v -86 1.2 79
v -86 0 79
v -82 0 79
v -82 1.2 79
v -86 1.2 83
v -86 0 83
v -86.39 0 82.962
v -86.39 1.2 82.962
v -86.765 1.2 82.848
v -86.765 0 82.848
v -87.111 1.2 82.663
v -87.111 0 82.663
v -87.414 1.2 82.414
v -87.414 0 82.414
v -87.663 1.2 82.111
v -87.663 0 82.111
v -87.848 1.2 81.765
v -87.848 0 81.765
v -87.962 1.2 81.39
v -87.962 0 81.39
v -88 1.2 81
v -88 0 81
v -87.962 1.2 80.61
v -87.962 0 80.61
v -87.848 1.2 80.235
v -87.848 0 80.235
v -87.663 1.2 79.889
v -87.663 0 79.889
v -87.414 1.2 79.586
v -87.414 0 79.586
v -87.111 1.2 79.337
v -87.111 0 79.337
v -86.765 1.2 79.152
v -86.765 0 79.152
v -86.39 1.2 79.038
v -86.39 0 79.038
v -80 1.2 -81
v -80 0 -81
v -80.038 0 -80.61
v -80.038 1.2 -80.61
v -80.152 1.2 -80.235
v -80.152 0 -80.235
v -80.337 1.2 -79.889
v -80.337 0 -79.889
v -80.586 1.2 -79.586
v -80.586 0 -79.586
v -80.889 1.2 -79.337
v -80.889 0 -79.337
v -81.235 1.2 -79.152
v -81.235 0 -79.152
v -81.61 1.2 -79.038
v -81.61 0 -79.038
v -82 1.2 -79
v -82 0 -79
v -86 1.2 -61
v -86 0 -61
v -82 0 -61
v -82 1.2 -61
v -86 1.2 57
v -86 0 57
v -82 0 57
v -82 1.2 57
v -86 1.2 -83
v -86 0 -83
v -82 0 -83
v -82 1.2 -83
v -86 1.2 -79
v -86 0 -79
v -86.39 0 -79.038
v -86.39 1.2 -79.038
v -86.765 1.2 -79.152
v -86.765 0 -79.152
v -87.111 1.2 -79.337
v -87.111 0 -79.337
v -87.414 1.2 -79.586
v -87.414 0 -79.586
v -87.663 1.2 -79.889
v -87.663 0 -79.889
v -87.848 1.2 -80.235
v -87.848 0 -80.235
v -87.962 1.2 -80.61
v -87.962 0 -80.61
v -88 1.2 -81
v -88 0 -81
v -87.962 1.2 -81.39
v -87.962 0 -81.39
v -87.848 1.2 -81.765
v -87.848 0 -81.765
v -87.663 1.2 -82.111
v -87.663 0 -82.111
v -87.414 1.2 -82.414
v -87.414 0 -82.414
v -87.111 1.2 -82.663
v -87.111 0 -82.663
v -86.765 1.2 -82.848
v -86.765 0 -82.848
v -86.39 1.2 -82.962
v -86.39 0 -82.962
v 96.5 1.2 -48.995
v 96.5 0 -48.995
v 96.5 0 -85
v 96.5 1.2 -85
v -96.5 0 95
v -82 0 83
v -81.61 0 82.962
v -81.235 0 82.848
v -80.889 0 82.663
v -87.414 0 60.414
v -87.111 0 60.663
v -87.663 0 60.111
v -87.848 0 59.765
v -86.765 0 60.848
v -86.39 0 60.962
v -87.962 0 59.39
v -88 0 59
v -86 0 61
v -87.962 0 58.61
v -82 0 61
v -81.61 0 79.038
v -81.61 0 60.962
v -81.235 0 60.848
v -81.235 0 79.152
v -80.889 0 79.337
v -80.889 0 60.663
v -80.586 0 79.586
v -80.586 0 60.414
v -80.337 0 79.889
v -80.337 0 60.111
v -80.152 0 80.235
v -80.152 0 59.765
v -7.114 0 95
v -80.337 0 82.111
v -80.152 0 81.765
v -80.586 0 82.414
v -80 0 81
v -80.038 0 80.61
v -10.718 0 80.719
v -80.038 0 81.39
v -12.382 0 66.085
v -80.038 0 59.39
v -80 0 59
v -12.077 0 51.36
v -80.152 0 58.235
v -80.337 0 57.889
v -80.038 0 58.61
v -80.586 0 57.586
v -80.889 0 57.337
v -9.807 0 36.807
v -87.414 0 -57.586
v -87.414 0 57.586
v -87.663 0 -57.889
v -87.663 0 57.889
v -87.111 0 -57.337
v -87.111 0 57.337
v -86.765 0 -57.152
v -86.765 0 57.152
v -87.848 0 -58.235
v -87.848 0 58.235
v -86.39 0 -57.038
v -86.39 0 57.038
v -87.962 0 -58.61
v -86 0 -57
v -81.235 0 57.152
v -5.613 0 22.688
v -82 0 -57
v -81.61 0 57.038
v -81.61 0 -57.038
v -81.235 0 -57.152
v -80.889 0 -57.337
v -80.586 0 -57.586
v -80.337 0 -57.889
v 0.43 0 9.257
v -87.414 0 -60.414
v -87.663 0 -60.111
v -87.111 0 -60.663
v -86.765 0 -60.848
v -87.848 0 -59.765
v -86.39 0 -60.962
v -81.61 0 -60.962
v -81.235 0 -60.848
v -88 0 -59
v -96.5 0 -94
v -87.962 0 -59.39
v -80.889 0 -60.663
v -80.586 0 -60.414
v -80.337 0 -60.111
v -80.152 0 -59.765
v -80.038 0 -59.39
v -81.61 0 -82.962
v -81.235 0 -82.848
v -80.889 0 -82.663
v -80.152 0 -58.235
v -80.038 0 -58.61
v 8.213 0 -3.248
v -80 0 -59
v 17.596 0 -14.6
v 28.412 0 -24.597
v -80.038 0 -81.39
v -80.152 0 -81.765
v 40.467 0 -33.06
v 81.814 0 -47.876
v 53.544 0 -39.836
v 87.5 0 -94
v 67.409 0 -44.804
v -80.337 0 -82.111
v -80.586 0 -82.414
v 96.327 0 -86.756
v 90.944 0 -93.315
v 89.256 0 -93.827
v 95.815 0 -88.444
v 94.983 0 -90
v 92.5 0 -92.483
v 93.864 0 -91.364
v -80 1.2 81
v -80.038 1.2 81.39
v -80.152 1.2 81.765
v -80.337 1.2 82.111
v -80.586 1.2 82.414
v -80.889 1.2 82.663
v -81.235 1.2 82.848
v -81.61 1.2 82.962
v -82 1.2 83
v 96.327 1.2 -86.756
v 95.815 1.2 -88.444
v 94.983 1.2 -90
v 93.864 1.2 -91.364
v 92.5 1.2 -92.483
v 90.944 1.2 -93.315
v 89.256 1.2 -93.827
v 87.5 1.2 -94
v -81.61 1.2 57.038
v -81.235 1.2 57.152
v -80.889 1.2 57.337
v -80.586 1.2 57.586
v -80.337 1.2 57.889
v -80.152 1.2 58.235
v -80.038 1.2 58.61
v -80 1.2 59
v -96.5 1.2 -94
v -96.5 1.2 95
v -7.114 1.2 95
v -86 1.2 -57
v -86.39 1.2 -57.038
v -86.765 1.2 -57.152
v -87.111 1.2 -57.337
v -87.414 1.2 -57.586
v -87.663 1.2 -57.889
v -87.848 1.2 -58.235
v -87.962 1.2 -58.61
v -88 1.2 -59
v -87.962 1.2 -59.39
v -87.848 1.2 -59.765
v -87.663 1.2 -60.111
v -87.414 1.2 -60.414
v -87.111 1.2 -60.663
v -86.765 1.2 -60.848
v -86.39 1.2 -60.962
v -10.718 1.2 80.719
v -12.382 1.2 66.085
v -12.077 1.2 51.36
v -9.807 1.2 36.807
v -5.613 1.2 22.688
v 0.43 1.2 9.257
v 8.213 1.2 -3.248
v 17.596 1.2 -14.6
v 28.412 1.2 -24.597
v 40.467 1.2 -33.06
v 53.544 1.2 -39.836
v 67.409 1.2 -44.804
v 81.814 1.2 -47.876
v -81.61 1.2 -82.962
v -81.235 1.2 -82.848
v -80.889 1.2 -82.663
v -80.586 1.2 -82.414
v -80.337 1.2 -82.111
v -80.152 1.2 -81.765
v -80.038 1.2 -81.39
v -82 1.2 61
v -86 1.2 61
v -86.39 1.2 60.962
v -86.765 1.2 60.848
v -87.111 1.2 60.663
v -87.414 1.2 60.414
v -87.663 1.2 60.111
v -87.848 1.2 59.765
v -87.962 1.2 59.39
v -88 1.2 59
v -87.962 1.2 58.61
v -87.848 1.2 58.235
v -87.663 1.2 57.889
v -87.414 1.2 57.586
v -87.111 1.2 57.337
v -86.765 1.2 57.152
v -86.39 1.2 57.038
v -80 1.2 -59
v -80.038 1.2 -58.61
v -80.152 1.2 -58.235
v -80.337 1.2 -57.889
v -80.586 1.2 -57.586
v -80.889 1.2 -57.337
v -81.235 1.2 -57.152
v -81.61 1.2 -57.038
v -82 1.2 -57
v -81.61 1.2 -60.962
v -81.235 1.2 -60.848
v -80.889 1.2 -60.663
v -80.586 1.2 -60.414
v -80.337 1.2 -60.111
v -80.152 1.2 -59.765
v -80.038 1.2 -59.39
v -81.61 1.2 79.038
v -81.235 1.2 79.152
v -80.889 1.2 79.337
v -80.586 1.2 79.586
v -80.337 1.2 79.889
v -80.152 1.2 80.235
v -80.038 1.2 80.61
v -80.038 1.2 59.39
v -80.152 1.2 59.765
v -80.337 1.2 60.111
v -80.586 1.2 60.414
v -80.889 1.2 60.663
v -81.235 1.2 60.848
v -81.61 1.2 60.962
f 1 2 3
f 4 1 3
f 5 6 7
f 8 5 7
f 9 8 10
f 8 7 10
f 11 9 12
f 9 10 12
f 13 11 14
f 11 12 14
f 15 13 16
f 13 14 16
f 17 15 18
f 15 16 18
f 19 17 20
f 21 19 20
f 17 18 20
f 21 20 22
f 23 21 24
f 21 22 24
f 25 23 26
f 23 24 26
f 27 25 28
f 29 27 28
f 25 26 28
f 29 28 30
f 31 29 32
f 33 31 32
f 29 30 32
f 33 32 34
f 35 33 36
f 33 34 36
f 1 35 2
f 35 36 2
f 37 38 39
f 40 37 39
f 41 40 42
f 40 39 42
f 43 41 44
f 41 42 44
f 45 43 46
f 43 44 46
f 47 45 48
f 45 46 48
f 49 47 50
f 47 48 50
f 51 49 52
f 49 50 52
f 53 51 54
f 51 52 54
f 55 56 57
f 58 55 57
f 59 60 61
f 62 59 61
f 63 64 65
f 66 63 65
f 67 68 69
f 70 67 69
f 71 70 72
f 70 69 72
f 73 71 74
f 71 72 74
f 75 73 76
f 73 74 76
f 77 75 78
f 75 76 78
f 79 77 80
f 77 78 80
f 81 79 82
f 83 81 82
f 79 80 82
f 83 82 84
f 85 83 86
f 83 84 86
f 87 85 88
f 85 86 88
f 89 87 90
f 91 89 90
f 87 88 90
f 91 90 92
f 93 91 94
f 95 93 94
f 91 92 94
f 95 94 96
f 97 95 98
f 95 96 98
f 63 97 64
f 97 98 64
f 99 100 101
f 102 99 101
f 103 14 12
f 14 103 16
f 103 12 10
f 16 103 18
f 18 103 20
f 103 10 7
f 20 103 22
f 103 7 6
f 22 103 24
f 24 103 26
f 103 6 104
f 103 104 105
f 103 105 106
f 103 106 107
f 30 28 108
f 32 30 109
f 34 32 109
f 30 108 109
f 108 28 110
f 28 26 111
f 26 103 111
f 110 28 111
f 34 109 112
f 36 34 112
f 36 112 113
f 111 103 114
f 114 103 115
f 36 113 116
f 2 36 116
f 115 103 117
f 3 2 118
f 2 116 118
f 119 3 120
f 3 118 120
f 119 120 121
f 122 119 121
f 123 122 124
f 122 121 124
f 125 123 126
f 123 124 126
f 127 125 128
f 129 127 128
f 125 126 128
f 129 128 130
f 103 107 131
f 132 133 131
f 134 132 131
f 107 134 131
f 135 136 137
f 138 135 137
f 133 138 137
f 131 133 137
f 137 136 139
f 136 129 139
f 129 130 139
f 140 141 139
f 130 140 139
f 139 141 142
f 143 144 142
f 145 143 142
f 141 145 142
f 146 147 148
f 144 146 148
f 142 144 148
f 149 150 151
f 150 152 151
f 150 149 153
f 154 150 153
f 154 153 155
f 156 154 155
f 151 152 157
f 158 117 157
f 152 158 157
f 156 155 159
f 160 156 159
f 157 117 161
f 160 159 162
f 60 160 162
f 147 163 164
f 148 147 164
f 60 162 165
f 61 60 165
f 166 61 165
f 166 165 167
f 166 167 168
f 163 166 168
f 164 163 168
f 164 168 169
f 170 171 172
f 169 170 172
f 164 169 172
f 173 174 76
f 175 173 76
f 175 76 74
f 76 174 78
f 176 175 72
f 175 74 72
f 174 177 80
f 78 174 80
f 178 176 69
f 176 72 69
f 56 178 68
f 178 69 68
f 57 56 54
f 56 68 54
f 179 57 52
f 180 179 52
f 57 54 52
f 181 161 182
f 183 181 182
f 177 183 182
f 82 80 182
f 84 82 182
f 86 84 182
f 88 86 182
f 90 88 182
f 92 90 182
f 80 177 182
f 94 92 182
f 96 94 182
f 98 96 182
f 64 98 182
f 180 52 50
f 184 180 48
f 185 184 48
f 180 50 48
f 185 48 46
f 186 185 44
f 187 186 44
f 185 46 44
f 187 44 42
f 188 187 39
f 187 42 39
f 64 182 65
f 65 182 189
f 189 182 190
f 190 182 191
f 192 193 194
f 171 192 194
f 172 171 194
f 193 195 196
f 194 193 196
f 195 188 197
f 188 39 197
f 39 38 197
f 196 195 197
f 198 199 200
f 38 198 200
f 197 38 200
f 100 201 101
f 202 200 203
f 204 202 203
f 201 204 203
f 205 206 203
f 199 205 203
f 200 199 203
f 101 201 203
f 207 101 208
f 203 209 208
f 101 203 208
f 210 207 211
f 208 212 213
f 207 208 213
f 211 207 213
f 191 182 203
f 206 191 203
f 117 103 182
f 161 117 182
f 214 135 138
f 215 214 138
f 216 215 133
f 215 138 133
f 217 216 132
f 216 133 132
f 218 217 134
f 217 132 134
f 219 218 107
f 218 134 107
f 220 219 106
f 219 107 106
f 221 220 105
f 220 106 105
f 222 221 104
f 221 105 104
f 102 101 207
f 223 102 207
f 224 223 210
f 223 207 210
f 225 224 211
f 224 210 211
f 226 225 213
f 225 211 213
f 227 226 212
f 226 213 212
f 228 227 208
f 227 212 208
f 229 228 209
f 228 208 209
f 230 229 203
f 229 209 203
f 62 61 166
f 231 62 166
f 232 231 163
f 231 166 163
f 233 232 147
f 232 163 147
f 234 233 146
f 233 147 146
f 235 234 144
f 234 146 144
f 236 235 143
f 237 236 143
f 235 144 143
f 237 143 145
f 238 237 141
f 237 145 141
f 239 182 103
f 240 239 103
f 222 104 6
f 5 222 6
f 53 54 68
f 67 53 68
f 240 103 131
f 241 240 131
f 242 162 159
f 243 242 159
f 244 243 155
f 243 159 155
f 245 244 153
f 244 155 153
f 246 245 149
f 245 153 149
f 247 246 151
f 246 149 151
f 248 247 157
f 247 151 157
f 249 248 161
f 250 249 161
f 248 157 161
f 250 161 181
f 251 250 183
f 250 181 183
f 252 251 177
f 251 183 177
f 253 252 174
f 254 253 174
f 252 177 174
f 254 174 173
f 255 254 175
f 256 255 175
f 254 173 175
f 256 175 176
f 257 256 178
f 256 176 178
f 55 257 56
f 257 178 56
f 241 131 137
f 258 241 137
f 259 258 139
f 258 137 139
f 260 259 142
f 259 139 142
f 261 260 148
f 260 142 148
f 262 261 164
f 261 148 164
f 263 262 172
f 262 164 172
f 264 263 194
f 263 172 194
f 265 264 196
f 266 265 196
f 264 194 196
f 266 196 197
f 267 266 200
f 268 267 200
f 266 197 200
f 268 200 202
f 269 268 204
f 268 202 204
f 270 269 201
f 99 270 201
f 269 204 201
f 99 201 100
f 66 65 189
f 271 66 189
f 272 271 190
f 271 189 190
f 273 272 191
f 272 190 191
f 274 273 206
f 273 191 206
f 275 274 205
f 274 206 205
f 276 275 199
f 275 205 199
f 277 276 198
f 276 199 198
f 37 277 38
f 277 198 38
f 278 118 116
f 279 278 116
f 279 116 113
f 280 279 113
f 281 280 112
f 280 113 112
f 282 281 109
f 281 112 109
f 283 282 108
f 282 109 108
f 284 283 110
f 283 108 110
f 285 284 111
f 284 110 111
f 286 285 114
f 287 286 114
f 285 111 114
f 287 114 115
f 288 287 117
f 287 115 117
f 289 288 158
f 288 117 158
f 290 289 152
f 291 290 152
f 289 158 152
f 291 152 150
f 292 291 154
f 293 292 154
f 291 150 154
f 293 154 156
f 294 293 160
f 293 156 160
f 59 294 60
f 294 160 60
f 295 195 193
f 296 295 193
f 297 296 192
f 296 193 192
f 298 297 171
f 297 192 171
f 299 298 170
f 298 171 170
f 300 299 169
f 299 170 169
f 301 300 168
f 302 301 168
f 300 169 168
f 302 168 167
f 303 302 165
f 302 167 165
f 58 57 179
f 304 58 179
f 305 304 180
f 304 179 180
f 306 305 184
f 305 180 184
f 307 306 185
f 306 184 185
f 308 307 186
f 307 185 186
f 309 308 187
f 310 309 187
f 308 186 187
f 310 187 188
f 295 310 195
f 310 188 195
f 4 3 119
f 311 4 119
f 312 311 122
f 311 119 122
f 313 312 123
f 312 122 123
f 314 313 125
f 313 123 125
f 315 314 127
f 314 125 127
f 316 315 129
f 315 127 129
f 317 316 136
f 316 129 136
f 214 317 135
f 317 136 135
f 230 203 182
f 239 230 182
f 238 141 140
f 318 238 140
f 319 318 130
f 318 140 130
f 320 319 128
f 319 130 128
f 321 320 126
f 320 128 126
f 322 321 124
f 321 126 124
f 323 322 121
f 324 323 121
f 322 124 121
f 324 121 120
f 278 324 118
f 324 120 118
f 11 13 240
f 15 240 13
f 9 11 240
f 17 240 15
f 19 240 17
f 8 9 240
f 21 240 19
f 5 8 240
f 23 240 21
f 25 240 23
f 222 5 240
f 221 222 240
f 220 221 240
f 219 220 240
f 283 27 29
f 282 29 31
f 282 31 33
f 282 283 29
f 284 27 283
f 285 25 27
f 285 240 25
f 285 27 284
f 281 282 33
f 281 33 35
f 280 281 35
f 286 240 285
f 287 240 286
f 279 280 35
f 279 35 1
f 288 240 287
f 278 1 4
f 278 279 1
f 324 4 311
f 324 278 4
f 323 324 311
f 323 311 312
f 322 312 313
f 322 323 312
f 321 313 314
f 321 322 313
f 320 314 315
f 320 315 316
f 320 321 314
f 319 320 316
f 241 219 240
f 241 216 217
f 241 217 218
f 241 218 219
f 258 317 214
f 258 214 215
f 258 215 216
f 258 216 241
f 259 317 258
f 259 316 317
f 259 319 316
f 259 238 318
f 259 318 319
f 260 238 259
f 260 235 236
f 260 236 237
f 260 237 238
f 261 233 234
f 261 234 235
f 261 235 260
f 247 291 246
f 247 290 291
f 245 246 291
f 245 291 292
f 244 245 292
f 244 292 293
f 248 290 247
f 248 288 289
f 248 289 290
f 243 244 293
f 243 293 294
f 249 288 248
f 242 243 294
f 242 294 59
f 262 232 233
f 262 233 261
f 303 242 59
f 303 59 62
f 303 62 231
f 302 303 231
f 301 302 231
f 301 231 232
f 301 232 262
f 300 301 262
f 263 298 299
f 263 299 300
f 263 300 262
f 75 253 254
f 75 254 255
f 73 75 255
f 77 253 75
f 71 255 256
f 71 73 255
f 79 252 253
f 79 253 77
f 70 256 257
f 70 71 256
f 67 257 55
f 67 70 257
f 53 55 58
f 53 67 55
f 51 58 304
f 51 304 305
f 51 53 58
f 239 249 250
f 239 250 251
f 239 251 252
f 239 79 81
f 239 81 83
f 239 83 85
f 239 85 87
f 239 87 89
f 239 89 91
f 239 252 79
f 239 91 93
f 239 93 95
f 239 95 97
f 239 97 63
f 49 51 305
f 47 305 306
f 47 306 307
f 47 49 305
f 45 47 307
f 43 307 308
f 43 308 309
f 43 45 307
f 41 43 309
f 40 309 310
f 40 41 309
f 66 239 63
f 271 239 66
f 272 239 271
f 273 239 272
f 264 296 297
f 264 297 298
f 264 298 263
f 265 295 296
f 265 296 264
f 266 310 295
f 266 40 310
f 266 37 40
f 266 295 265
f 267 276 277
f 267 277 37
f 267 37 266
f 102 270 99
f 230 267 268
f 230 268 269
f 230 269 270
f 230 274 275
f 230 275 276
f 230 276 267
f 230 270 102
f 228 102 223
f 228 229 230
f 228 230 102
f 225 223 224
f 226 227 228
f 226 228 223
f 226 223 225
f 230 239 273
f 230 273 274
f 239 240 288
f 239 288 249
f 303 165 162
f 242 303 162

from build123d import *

# Parameters (mm, degrees)
EXTRUDE_1_DEPTH = 1.2


with BuildPart() as part:
    # 스케치1 → 보스-돌출1 (new body)
    with BuildSketch(Plane(origin=(0, 0, 0), x_dir=(1, 0, 0), z_dir=(0, 1, 0))):
        with BuildLine():
            Line((96.5, 48.995454452), (96.5, 85))
            ThreePointArc((96.5, 85), (93.863961031, 91.363961031), (87.5, 94))
            Line((87.5, 94), (-96.5, 94))
            Line((-96.5, 94), (-96.5, -95))
            Line((-96.5, -95), (-7.113574645, -95))
            ThreePointArc((-7.113574645, -95), (8.212657599, 3.247727485), (96.5, 48.995454452))
        make_face()
        with BuildLine():
            ThreePointArc((-86, -83), (-88, -81), (-86, -79))
            Line((-86, -79), (-84, -79))
            Line((-84, -79), (-82, -79))
            ThreePointArc((-82, -79), (-80.585786438, -79.585786438), (-80, -81))
            ThreePointArc((-80, -81), (-80.585786438, -82.414213562), (-82, -83))
            Line((-82, -83), (-84, -83))
            Line((-84, -83), (-86, -83))
        make_face(mode=Mode.SUBTRACT)
        with BuildLine():
            ThreePointArc((-86, -61), (-88, -59), (-86, -57))
            Line((-86, -57), (-84, -57))
            Line((-84, -57), (-82, -57))
            ThreePointArc((-82, -57), (-80.585786438, -57.585786438), (-80, -59))
            ThreePointArc((-80, -59), (-80.585786438, -60.414213562), (-82, -61))
            Line((-82, -61), (-84, -61))
            Line((-84, -61), (-86, -61))
        make_face(mode=Mode.SUBTRACT)
        with BuildLine():
            ThreePointArc((-86, 57), (-88, 59), (-86, 61))
            Line((-86, 61), (-84, 61))
            Line((-84, 61), (-82, 61))
            ThreePointArc((-82, 61), (-80.585786438, 60.414213562), (-80, 59))
            ThreePointArc((-80, 59), (-80.585786438, 57.585786438), (-82, 57))
            Line((-82, 57), (-84, 57))
            Line((-84, 57), (-86, 57))
        make_face(mode=Mode.SUBTRACT)
        with BuildLine():
            ThreePointArc((-86, 79), (-88, 81), (-86, 83))
            Line((-86, 83), (-84, 83))
            Line((-84, 83), (-82, 83))
            ThreePointArc((-82, 83), (-80.585786438, 82.414213562), (-80, 81))
            ThreePointArc((-80, 81), (-80.585786438, 79.585786438), (-82, 79))
            Line((-82, 79), (-84, 79))
            Line((-84, 79), (-86, 79))
        make_face(mode=Mode.SUBTRACT)
    extrude(amount=EXTRUDE_1_DEPTH)


solid = part.part
